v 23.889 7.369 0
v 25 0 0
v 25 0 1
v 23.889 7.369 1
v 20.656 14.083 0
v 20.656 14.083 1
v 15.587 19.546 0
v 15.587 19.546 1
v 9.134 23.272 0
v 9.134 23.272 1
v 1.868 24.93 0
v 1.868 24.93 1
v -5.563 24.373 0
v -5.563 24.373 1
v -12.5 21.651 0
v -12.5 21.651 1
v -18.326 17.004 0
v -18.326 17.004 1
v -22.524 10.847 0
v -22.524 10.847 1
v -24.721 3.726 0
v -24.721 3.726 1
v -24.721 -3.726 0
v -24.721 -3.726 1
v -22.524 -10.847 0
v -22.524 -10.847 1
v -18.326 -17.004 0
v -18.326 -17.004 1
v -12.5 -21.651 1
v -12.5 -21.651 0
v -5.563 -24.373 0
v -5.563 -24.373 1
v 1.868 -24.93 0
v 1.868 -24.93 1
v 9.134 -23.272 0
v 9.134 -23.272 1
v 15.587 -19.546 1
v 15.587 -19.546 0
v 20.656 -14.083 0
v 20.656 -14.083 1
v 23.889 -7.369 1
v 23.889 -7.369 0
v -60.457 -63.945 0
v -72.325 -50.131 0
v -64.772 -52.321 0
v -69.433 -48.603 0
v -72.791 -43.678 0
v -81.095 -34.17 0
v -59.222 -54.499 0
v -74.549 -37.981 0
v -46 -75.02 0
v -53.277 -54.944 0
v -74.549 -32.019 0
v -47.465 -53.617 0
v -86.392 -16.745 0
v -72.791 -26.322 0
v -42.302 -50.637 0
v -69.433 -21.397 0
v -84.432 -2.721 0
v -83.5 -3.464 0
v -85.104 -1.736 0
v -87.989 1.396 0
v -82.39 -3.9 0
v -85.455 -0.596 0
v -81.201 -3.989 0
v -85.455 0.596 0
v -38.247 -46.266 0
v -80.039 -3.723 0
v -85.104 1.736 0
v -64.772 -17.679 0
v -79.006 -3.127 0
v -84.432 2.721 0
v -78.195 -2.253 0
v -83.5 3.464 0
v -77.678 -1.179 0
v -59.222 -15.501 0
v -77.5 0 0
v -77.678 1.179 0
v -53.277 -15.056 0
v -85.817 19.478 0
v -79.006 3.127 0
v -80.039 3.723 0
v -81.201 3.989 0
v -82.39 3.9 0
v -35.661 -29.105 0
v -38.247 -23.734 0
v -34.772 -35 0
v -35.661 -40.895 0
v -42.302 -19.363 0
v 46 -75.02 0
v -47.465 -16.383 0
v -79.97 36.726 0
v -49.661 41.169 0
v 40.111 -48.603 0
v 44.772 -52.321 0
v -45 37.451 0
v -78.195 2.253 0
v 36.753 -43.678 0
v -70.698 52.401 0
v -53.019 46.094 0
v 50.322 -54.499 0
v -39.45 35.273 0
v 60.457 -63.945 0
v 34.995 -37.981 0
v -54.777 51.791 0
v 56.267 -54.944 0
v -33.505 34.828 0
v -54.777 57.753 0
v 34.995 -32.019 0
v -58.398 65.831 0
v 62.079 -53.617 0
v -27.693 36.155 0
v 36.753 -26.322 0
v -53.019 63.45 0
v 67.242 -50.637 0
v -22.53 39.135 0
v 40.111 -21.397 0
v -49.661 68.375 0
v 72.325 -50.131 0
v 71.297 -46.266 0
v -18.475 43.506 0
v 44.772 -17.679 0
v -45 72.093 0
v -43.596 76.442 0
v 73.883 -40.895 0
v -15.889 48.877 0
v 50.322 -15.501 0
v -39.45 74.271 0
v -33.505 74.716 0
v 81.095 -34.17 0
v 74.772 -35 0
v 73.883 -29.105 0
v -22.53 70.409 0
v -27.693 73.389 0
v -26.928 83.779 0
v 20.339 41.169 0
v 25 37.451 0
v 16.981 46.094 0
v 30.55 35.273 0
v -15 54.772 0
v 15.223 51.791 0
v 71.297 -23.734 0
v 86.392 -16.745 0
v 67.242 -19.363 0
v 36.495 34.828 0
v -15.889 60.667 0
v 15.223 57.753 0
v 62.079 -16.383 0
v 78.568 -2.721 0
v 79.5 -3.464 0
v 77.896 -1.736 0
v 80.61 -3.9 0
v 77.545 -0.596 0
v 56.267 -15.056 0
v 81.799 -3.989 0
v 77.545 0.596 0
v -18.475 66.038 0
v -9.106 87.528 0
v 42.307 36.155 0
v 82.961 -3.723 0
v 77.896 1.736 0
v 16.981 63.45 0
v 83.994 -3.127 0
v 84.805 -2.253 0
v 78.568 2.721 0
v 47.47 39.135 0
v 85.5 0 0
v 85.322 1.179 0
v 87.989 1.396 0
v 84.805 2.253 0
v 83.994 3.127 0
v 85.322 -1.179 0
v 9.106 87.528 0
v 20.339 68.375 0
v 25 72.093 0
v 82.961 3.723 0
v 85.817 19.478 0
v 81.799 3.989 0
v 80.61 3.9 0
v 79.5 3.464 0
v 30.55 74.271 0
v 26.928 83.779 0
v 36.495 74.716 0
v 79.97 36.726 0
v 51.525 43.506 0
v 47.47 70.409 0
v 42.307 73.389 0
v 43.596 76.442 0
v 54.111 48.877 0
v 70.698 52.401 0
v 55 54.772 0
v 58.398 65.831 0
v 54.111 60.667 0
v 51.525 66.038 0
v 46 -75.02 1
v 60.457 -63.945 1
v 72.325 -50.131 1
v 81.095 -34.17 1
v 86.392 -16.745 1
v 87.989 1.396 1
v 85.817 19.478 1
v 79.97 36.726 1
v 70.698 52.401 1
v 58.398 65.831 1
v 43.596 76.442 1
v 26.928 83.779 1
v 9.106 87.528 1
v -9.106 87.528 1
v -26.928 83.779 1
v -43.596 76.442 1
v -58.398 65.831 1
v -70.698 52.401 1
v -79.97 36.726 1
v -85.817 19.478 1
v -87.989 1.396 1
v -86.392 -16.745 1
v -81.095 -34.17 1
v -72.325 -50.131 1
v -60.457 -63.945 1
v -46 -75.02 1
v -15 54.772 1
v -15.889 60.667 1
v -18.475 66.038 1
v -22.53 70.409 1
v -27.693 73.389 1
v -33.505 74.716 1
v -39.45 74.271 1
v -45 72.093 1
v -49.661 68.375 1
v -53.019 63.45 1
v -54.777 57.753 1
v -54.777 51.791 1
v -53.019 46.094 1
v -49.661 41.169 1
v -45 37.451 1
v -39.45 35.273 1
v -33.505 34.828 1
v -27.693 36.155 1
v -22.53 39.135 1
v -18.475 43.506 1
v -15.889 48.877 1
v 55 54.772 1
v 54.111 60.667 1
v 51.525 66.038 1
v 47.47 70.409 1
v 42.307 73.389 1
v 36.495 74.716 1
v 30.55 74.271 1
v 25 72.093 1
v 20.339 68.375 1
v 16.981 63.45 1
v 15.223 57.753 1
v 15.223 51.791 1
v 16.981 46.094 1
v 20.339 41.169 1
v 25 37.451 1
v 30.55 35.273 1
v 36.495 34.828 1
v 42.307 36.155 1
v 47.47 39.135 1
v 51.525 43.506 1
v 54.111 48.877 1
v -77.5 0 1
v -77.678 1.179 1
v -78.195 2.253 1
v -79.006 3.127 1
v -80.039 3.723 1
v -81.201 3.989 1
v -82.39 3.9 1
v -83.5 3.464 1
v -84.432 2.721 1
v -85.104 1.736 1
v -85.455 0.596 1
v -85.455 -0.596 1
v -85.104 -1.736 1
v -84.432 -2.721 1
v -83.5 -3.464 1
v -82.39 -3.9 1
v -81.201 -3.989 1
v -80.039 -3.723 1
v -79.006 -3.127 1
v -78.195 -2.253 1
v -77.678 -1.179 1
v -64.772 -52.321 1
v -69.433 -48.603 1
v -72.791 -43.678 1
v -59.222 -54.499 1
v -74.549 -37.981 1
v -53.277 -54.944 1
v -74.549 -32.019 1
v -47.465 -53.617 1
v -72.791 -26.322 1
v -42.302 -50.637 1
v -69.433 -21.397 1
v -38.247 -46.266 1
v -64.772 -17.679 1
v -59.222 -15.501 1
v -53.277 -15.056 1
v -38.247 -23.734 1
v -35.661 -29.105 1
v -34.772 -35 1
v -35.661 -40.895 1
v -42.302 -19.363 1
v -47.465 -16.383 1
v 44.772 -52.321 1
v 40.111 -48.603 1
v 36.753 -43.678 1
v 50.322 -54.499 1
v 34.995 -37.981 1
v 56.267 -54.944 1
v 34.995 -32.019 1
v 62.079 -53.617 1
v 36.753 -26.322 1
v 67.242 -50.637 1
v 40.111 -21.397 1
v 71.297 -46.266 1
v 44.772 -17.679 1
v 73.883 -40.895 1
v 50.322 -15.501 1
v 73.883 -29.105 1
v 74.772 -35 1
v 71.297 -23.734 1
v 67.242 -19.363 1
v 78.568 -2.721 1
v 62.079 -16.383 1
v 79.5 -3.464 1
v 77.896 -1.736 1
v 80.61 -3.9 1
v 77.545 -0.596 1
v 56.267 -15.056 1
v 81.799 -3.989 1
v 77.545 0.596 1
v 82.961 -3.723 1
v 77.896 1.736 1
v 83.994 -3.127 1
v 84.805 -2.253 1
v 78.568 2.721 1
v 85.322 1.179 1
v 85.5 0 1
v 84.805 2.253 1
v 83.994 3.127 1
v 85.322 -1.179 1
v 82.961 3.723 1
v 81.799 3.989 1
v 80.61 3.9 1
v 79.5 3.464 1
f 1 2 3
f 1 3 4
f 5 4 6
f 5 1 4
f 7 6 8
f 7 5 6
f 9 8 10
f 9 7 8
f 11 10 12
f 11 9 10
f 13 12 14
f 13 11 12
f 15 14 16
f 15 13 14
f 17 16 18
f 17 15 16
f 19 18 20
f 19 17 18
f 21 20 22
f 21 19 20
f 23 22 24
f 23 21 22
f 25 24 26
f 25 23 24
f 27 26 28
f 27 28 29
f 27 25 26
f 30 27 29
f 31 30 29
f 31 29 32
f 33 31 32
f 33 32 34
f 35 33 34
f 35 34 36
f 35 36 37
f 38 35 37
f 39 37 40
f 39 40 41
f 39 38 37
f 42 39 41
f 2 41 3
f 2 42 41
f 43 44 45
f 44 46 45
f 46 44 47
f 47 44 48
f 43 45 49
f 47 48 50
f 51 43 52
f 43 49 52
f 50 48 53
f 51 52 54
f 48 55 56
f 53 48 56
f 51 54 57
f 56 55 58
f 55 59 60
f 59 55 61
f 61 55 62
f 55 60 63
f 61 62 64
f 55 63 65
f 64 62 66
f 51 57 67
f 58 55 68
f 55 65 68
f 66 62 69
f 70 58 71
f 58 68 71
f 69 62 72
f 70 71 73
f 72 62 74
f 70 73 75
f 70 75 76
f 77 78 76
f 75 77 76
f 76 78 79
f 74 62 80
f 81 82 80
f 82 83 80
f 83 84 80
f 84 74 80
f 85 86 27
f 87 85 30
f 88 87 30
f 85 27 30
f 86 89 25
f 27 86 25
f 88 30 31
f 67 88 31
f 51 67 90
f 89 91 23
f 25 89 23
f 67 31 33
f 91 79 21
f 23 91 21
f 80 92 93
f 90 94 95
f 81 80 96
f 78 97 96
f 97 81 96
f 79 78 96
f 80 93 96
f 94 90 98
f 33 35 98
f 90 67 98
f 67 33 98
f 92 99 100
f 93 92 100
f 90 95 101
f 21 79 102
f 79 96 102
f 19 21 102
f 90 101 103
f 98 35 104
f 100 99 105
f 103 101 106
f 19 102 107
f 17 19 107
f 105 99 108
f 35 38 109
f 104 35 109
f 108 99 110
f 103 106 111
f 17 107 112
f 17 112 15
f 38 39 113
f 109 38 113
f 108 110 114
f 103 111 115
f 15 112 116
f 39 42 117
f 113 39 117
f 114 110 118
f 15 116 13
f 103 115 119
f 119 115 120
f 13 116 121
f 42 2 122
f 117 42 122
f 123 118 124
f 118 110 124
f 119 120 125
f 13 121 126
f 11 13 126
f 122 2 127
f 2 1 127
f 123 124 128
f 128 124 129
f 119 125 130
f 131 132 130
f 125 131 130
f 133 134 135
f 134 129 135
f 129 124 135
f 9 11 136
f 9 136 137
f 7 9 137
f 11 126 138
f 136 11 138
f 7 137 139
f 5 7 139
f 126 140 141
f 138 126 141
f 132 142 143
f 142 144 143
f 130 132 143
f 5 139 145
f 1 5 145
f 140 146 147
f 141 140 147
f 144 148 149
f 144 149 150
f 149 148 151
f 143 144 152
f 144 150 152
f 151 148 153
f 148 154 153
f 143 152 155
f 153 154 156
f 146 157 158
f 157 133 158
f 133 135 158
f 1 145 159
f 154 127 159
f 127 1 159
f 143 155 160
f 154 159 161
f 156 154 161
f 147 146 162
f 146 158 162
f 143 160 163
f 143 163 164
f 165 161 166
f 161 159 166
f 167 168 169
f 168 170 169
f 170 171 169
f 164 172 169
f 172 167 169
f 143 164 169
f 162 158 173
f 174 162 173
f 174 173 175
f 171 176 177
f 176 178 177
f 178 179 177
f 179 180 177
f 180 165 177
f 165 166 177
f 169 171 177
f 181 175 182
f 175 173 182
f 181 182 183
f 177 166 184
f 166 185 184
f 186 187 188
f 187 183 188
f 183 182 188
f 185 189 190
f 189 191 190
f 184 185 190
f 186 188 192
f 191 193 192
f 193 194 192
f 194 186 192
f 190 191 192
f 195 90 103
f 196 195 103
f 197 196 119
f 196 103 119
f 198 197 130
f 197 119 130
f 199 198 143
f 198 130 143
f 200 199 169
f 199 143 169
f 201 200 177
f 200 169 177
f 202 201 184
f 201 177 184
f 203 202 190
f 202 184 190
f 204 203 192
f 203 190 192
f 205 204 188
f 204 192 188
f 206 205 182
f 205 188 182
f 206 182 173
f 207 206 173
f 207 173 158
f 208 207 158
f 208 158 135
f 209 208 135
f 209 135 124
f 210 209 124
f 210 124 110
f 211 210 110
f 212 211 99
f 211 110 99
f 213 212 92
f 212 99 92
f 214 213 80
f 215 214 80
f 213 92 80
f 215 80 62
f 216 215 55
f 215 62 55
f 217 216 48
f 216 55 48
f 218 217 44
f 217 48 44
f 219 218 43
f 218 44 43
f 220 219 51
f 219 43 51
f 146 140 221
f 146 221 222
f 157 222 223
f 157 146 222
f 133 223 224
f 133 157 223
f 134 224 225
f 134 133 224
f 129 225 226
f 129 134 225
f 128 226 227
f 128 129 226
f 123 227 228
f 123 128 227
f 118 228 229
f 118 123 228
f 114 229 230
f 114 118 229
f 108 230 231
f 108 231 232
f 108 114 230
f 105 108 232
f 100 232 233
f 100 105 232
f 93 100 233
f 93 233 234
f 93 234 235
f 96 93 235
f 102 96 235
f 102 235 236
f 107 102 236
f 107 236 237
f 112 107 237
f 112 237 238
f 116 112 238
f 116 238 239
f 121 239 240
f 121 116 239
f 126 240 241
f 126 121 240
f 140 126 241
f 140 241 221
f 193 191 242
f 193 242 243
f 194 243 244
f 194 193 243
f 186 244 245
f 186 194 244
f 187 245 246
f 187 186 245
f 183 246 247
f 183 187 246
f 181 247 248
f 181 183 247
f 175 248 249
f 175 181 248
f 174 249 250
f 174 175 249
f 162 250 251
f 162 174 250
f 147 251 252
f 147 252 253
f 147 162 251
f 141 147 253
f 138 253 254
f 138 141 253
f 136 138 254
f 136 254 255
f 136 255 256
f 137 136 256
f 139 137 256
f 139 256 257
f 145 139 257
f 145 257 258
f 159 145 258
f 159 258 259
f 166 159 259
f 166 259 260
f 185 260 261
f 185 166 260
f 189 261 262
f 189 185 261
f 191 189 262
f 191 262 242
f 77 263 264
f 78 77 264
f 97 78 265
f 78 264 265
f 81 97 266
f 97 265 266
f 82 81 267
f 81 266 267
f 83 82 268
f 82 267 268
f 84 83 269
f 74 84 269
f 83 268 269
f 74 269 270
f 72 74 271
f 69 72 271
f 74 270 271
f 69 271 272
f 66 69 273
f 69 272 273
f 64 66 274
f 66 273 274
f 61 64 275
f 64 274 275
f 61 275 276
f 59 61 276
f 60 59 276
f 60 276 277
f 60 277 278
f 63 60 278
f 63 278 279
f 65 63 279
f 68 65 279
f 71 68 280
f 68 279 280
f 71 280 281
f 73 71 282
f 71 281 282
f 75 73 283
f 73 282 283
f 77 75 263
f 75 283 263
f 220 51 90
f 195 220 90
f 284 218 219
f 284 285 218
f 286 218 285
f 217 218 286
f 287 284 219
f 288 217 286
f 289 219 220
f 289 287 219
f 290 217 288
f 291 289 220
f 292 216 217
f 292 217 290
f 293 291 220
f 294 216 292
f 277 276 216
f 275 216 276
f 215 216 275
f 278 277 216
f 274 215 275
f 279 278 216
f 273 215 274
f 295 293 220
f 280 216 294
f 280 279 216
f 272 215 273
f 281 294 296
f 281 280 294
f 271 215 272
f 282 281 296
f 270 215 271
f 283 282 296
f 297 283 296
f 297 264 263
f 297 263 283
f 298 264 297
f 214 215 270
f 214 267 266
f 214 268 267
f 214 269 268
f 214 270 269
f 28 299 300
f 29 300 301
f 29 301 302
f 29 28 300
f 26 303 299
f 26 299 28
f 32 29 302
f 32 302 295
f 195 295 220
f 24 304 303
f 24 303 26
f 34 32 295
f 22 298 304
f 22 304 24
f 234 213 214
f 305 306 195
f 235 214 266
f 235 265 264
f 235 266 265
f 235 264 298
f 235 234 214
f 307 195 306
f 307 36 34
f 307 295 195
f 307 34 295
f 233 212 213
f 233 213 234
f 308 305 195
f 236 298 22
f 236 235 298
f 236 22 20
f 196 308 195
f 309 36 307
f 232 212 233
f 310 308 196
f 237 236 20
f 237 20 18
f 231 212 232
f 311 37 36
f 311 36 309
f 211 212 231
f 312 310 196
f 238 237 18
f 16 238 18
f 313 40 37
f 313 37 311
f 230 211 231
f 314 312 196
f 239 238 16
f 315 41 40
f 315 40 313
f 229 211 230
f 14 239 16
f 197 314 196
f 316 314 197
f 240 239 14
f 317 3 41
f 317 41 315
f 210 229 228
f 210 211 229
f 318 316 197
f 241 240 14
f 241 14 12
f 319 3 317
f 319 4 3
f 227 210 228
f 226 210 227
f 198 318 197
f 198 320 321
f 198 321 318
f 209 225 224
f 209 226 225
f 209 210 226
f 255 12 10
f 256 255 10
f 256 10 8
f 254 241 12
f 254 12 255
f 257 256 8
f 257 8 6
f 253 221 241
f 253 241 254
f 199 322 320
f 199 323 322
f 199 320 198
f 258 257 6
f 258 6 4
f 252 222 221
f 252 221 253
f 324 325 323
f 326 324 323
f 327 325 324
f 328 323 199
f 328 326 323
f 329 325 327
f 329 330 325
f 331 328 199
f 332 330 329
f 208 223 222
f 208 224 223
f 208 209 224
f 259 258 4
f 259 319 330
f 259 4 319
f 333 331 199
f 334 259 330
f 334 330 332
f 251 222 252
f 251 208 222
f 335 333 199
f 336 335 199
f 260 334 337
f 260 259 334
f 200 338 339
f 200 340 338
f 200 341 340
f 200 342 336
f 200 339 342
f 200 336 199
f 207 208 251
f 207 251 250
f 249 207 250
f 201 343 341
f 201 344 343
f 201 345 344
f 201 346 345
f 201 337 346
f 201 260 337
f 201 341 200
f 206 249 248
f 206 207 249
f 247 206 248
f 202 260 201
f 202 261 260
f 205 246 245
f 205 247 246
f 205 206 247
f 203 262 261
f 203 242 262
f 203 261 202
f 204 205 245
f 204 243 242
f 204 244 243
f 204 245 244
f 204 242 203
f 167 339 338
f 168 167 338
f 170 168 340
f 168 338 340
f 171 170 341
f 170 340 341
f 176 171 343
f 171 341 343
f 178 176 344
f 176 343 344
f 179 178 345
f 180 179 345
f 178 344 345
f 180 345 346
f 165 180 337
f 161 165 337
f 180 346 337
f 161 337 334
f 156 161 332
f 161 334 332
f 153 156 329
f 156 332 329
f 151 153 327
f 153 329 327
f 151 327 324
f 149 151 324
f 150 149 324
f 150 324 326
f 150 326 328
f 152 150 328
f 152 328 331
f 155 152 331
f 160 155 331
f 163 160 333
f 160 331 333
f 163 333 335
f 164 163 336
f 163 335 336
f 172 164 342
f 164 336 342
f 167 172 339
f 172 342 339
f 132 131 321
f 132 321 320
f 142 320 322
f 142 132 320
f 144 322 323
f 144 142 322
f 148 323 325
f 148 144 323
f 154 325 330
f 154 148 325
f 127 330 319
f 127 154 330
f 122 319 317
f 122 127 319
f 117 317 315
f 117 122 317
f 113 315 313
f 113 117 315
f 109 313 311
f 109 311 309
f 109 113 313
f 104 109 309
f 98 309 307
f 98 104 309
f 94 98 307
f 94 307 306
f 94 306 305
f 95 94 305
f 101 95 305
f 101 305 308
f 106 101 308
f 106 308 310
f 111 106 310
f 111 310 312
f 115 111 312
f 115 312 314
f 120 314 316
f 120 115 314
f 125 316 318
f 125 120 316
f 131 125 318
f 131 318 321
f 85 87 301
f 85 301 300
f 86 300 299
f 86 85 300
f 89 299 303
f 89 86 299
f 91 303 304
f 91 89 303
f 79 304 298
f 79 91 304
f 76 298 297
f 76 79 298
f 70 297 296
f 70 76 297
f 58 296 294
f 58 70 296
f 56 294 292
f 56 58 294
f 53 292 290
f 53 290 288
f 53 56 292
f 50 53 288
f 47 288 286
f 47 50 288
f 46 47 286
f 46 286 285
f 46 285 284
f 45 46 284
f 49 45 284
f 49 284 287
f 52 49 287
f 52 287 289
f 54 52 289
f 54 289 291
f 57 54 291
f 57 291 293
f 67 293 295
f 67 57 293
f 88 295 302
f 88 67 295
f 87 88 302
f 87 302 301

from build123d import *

# Parameters (mm, degrees)
ESBO_O1_R                = 25
ESBO_O1_R_2              = 20
RESSALTO_EXTRUS_O1_DEPTH = 1
ESBO_O2_R                = 4
CORTE_EXTRUS_O1_DEPTH    = 1


with BuildPart() as part:
    # Esboço1 → Ressalto-extrusão1 (new body)
    with BuildSketch(Plane.XY):
        with BuildLine():
            Line((-46, -75.019997334), (46, -75.019997334))
            ThreePointArc((46, -75.019997334), (0, 88), (-46, -75.019997334))
        make_face()
        Circle(ESBO_O1_R, mode=Mode.SUBTRACT)
        with Locations((-35, 54.772)):
            Circle(ESBO_O1_R_2, mode=Mode.SUBTRACT)
        with Locations((35, 54.772)):
            Circle(ESBO_O1_R_2, mode=Mode.SUBTRACT)
        with Locations((-54.772, -35)):
            Circle(ESBO_O1_R_2, mode=Mode.SUBTRACT)
        with Locations((54.772, -35)):
            Circle(ESBO_O1_R_2, mode=Mode.SUBTRACT)
    extrude(amount=RESSALTO_EXTRUS_O1_DEPTH)

    # Esboço2 → Corte-extrusão1 (cut)
    with BuildSketch(Plane.XY.offset(1)):
        with Locations((81.5, 0)):
            Circle(ESBO_O2_R)
        with Locations((-81.5, 0)):
            Circle(ESBO_O2_R)
    extrude(amount=-CORTE_EXTRUS_O1_DEPTH, mode=Mode.SUBTRACT)


solid = part.part
